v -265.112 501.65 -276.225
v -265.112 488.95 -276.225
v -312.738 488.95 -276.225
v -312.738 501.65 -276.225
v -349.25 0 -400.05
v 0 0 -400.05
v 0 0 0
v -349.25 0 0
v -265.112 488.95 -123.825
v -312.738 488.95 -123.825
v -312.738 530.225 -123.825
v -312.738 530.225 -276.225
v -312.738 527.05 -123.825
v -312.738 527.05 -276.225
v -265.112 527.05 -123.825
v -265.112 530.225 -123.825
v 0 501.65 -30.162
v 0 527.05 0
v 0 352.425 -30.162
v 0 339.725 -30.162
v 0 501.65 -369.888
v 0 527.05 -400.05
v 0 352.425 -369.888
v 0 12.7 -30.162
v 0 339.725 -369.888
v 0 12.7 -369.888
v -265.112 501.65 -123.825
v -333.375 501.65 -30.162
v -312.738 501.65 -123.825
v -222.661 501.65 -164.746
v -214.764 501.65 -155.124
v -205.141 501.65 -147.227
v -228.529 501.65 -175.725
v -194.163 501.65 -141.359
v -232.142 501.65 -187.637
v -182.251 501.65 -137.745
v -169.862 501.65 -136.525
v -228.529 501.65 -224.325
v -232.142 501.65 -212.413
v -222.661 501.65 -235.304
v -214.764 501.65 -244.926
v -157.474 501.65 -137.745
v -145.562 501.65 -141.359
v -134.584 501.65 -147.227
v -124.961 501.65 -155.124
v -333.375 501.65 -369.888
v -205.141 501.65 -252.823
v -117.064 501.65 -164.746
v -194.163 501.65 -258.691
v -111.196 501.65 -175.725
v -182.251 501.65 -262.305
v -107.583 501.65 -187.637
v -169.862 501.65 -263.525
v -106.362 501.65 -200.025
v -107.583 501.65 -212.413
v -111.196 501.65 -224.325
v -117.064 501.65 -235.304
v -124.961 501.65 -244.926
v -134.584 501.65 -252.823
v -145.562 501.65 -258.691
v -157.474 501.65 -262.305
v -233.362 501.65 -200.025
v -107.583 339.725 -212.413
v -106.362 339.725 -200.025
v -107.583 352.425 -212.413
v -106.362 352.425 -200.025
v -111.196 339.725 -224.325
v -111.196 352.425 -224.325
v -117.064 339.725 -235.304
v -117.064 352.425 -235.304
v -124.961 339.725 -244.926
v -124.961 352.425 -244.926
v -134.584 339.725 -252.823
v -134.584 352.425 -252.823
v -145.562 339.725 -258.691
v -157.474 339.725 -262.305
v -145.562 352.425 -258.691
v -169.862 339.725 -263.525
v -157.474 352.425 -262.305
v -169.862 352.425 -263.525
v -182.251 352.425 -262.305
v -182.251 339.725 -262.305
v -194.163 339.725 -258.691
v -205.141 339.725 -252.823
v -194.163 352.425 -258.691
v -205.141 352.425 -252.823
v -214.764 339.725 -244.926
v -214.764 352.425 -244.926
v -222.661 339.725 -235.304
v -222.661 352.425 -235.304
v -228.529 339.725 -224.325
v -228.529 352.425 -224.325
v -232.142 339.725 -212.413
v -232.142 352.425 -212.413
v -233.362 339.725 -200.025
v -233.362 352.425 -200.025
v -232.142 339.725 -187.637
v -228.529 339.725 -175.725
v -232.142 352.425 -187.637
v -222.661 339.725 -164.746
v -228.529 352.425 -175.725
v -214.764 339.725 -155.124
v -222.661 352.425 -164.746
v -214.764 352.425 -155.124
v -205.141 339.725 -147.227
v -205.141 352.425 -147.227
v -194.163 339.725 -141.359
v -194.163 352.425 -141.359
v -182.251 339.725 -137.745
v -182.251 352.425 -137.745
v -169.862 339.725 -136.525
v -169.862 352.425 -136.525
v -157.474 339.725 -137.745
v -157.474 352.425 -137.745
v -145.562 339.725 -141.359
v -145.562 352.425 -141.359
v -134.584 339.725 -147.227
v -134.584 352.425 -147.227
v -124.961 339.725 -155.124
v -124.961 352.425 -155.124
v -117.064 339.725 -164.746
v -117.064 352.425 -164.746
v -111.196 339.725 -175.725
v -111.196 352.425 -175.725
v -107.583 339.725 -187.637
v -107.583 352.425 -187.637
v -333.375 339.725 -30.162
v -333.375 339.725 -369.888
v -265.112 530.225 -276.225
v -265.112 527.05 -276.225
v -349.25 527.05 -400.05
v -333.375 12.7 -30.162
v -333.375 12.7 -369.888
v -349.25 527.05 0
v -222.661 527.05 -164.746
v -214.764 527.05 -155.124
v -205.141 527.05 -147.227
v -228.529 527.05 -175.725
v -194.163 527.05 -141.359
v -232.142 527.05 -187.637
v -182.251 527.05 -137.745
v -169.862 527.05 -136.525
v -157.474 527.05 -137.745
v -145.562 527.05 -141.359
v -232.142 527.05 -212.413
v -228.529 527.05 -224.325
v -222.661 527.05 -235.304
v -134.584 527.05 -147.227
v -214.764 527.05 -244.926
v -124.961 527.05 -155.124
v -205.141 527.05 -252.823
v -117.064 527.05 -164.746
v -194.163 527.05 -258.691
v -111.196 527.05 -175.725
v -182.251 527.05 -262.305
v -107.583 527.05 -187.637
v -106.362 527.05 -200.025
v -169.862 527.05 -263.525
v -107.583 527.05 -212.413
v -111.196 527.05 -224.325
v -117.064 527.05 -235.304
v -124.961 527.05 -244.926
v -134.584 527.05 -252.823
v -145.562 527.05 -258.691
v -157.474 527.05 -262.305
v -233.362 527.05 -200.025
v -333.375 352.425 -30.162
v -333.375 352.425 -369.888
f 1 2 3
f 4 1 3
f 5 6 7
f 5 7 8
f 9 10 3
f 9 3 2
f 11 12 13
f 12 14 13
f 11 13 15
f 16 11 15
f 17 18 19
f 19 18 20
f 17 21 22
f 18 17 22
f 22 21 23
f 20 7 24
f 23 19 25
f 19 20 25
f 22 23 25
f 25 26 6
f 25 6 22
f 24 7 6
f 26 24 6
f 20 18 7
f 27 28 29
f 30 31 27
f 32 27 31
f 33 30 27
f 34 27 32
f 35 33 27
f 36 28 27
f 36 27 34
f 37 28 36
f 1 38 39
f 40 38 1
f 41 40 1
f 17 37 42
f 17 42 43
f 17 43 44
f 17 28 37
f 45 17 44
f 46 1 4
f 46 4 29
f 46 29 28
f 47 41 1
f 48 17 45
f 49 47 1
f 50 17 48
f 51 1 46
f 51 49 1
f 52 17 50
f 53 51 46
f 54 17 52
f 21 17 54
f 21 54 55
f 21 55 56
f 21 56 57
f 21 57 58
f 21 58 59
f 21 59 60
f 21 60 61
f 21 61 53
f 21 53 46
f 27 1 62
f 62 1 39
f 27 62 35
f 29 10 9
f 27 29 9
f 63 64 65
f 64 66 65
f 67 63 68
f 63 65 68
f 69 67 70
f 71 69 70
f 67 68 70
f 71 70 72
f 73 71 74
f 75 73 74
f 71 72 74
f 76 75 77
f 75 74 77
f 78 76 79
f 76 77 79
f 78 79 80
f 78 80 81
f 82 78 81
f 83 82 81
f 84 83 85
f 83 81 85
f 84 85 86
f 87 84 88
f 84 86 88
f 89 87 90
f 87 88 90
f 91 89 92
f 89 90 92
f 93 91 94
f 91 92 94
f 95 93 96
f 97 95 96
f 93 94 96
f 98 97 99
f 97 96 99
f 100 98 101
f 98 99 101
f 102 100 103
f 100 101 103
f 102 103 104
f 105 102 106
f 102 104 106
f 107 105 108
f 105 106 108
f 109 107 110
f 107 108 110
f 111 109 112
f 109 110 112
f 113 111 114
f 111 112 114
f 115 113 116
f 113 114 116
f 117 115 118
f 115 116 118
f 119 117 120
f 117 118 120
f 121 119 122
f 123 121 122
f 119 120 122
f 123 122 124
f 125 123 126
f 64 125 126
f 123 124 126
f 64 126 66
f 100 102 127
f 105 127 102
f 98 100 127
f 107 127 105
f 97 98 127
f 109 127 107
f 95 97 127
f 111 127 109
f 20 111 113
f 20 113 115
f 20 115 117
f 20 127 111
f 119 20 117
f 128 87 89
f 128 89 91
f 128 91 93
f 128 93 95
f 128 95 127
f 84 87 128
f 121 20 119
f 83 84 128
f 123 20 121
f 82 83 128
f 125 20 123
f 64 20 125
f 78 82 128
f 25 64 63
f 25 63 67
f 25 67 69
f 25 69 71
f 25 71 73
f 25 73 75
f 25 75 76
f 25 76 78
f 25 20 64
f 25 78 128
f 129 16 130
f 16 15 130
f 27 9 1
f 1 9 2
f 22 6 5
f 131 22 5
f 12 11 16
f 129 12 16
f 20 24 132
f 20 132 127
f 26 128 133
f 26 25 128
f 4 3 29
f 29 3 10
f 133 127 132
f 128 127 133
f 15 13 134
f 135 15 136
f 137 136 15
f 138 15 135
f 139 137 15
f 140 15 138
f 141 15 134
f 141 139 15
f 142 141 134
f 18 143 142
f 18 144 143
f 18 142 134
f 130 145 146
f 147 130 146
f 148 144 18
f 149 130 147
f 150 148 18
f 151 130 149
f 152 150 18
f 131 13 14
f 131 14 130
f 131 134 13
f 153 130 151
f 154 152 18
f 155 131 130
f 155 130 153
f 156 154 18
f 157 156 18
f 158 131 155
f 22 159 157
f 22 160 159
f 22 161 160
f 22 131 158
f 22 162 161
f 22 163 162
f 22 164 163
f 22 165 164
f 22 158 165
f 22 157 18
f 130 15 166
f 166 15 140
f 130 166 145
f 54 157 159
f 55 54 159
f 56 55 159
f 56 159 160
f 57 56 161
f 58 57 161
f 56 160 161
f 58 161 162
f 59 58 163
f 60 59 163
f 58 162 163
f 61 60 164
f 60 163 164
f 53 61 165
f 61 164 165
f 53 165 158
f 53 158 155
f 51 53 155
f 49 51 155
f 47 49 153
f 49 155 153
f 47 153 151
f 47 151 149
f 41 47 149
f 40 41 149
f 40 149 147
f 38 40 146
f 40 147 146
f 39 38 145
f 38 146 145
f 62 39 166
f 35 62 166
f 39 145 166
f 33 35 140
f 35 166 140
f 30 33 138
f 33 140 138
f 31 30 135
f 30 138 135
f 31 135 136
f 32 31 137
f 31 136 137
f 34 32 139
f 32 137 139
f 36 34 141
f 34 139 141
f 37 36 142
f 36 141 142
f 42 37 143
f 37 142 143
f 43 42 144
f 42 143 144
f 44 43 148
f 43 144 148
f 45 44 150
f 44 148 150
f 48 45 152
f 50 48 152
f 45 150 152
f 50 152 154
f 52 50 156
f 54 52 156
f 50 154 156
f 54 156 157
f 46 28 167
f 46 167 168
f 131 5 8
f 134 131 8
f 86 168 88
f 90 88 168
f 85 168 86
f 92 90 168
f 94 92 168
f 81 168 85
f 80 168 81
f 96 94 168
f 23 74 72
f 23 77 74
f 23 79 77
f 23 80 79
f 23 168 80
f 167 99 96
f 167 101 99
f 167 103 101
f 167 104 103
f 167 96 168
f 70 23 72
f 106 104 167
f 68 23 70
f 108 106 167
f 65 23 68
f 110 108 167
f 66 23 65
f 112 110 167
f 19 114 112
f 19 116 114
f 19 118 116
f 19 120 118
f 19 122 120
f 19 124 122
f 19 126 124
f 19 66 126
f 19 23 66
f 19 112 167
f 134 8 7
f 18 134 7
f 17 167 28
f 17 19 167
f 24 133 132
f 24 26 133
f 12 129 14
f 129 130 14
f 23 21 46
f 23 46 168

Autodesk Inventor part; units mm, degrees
ref_plane "YZ Plane" through (0, 0, 0) normal (1, 0, 0) x (0, 1, 0)
ref_plane "XZ Plane" through (0, 0, 0) normal (0, 1, 0) x (-1, 0, 0)
ref_plane "XY Plane" through (0, 0, 0) normal (0, 0, 1) x (1, 0, 0)
sketch "Sketch1" plane through (0, 0, 0) normal (0, 1, 0) x (-1, 0, 0)
  line L0 (0, 0) -> (349.25, 0)
  line L1 (349.25, 0) -> (349.25, -400.05)
  line L2 (349.25, -400.05) -> (0, -400.05)
  line L3 (0, -400.05) -> (0, 0)
  dimension "d0" = 400.05
  dimension "d1" = 349.25
extrude "Extrusion1" add sketch "Sketch1" along normal blind 352.425
sketch "Sketch2" plane through (0, 0, 0) normal (1, 0, 0) x (0, 0, -1)
  line L0 (30.1625, 339.725) -> (369.8875, 339.725)
  line L1 (369.8875, 339.725) -> (369.8875, 12.7)
  line L2 (369.8875, 12.7) -> (30.1625, 12.7)
  line L3 (30.1625, 12.7) -> (30.1625, 339.725)
  line L4 (0, 0) -> (400.05, 0) projected
  line L5 (0, 352.425) -> (400.05, 352.425) projected
  line L6 (0, 0) -> (0, 352.425) projected
  line L7 (400.05, 0) -> (400.05, 352.425) projected
  dimension "d4" = 12.7
  dimension "d5" = 12.7
  dimension "d6" = 339.725
  dimension "d7" = 30.1625
  dimension "d8" = 30.1625
extrude "Extrusion2" cut sketch "Sketch2" against normal blind 333.375 contours L0 L1 L2 L3
sketch "Sketch3" plane through (0, 352.425, 0) normal (0, 1, 0) x (1, 0, 0)
  line L0 (0, 400.05) -> (-349.25, 400.05) projected
  line L1 (-349.25, 400.05) -> (-349.25, 0) projected
  line L2 (-349.25, 0) -> (0, 0) projected
  line L3 (0, 0) -> (0, 400.05) projected
extrude "Extrusion3" add sketch "Sketch3" along normal blind 174.625
sketch "Sketch4" plane through (0, 0, 0) normal (1, 0, 0) x (0, 0, -1)
  line L0 (369.8875, 339.725) -> (369.8875, 12.7) projected
  line L1 (369.8875, 12.7) -> (30.1625, 12.7) projected
  line L2 (30.1625, 12.7) -> (30.1625, 339.725) projected
  line L3 (30.1625, 339.725) -> (369.8875, 339.725) projected
  line L4 (0, 0) -> (400.05, 0) projected
  line L5 (400.05, 0) -> (400.05, 527.05) projected
  line L6 (0, 527.05) -> (400.05, 527.05) projected
  line L7 (0, 0) -> (0, 527.05) projected
  line L8 (30.1625, 501.65) -> (369.8875, 501.65)
  line L9 (369.8875, 501.65) -> (369.8875, 352.425)
  line L10 (369.8875, 352.425) -> (30.1625, 352.425)
  line L11 (30.1625, 352.425) -> (30.1625, 501.65)
  point P0 (200.025, 501.65)
  dimension "d13" = 12.7
  dimension "d14" = 25.4
extrude "Extrusion4" cut sketch "Sketch4" against normal blind 333.375 contours L8 L9 L10 L11
sketch "Sketch5" plane through (0, 527.05, 0) normal (0, 1, 0) x (1, 0, 0)
  line L0 (-349.25, 400.05) -> (-349.25, 0) projected
  line L1 (-349.25, 0) -> (0, 0) projected
  line L2 (0, 0) -> (0, 400.05) projected
  line L3 (0, 400.05) -> (-349.25, 400.05) projected
  circle A0 centre (-169.8625, 200.025) radius 63.5
  line L4 (-106.3625, 200.025) -> (0, 200.025) construction
  dimension "d17" = 127
  dimension "d20" = 106.3625
extrude "Extrusion5" cut sketch "Sketch5" against normal blind 193.675 contours A0
sketch "Sketch6" plane through (0, 527.05, 0) normal (0, 1, 0) x (1, 0, 0)
  line L0 (-312.7375, 123.825) -> (-265.1125, 123.825)
  line L1 (-265.1125, 123.825) -> (-265.1125, 276.225)
  line L2 (-265.1125, 276.225) -> (-312.7375, 276.225)
  line L3 (-312.7375, 276.225) -> (-312.7375, 123.825)
  line L4 (-349.25, 400.05) -> (-349.25, 0) projected
  line L5 (-349.25, 0) -> (0, 0) projected
  line L6 (0, 400.05) -> (-349.25, 400.05) projected
  line L7 (0, 0) -> (0, 400.05) projected
  circle A0 centre (-169.8625, 200.025) radius 63.5 projected
  line L8 (-233.3625, 200.025) -> (-265.1125, 200.025)
  dimension "d23" = 152.4
  dimension "d24" = 47.625
  dimension "d26" = 123.825
  dimension "d27" = 123.825
  dimension "d32" = 265.1125
extrude "Extrusion6" add sketch "Sketch6" along normal blind 3.175 and the other way blind 38.1 contours L3 L2 L1 L0
properties part number "Table"
